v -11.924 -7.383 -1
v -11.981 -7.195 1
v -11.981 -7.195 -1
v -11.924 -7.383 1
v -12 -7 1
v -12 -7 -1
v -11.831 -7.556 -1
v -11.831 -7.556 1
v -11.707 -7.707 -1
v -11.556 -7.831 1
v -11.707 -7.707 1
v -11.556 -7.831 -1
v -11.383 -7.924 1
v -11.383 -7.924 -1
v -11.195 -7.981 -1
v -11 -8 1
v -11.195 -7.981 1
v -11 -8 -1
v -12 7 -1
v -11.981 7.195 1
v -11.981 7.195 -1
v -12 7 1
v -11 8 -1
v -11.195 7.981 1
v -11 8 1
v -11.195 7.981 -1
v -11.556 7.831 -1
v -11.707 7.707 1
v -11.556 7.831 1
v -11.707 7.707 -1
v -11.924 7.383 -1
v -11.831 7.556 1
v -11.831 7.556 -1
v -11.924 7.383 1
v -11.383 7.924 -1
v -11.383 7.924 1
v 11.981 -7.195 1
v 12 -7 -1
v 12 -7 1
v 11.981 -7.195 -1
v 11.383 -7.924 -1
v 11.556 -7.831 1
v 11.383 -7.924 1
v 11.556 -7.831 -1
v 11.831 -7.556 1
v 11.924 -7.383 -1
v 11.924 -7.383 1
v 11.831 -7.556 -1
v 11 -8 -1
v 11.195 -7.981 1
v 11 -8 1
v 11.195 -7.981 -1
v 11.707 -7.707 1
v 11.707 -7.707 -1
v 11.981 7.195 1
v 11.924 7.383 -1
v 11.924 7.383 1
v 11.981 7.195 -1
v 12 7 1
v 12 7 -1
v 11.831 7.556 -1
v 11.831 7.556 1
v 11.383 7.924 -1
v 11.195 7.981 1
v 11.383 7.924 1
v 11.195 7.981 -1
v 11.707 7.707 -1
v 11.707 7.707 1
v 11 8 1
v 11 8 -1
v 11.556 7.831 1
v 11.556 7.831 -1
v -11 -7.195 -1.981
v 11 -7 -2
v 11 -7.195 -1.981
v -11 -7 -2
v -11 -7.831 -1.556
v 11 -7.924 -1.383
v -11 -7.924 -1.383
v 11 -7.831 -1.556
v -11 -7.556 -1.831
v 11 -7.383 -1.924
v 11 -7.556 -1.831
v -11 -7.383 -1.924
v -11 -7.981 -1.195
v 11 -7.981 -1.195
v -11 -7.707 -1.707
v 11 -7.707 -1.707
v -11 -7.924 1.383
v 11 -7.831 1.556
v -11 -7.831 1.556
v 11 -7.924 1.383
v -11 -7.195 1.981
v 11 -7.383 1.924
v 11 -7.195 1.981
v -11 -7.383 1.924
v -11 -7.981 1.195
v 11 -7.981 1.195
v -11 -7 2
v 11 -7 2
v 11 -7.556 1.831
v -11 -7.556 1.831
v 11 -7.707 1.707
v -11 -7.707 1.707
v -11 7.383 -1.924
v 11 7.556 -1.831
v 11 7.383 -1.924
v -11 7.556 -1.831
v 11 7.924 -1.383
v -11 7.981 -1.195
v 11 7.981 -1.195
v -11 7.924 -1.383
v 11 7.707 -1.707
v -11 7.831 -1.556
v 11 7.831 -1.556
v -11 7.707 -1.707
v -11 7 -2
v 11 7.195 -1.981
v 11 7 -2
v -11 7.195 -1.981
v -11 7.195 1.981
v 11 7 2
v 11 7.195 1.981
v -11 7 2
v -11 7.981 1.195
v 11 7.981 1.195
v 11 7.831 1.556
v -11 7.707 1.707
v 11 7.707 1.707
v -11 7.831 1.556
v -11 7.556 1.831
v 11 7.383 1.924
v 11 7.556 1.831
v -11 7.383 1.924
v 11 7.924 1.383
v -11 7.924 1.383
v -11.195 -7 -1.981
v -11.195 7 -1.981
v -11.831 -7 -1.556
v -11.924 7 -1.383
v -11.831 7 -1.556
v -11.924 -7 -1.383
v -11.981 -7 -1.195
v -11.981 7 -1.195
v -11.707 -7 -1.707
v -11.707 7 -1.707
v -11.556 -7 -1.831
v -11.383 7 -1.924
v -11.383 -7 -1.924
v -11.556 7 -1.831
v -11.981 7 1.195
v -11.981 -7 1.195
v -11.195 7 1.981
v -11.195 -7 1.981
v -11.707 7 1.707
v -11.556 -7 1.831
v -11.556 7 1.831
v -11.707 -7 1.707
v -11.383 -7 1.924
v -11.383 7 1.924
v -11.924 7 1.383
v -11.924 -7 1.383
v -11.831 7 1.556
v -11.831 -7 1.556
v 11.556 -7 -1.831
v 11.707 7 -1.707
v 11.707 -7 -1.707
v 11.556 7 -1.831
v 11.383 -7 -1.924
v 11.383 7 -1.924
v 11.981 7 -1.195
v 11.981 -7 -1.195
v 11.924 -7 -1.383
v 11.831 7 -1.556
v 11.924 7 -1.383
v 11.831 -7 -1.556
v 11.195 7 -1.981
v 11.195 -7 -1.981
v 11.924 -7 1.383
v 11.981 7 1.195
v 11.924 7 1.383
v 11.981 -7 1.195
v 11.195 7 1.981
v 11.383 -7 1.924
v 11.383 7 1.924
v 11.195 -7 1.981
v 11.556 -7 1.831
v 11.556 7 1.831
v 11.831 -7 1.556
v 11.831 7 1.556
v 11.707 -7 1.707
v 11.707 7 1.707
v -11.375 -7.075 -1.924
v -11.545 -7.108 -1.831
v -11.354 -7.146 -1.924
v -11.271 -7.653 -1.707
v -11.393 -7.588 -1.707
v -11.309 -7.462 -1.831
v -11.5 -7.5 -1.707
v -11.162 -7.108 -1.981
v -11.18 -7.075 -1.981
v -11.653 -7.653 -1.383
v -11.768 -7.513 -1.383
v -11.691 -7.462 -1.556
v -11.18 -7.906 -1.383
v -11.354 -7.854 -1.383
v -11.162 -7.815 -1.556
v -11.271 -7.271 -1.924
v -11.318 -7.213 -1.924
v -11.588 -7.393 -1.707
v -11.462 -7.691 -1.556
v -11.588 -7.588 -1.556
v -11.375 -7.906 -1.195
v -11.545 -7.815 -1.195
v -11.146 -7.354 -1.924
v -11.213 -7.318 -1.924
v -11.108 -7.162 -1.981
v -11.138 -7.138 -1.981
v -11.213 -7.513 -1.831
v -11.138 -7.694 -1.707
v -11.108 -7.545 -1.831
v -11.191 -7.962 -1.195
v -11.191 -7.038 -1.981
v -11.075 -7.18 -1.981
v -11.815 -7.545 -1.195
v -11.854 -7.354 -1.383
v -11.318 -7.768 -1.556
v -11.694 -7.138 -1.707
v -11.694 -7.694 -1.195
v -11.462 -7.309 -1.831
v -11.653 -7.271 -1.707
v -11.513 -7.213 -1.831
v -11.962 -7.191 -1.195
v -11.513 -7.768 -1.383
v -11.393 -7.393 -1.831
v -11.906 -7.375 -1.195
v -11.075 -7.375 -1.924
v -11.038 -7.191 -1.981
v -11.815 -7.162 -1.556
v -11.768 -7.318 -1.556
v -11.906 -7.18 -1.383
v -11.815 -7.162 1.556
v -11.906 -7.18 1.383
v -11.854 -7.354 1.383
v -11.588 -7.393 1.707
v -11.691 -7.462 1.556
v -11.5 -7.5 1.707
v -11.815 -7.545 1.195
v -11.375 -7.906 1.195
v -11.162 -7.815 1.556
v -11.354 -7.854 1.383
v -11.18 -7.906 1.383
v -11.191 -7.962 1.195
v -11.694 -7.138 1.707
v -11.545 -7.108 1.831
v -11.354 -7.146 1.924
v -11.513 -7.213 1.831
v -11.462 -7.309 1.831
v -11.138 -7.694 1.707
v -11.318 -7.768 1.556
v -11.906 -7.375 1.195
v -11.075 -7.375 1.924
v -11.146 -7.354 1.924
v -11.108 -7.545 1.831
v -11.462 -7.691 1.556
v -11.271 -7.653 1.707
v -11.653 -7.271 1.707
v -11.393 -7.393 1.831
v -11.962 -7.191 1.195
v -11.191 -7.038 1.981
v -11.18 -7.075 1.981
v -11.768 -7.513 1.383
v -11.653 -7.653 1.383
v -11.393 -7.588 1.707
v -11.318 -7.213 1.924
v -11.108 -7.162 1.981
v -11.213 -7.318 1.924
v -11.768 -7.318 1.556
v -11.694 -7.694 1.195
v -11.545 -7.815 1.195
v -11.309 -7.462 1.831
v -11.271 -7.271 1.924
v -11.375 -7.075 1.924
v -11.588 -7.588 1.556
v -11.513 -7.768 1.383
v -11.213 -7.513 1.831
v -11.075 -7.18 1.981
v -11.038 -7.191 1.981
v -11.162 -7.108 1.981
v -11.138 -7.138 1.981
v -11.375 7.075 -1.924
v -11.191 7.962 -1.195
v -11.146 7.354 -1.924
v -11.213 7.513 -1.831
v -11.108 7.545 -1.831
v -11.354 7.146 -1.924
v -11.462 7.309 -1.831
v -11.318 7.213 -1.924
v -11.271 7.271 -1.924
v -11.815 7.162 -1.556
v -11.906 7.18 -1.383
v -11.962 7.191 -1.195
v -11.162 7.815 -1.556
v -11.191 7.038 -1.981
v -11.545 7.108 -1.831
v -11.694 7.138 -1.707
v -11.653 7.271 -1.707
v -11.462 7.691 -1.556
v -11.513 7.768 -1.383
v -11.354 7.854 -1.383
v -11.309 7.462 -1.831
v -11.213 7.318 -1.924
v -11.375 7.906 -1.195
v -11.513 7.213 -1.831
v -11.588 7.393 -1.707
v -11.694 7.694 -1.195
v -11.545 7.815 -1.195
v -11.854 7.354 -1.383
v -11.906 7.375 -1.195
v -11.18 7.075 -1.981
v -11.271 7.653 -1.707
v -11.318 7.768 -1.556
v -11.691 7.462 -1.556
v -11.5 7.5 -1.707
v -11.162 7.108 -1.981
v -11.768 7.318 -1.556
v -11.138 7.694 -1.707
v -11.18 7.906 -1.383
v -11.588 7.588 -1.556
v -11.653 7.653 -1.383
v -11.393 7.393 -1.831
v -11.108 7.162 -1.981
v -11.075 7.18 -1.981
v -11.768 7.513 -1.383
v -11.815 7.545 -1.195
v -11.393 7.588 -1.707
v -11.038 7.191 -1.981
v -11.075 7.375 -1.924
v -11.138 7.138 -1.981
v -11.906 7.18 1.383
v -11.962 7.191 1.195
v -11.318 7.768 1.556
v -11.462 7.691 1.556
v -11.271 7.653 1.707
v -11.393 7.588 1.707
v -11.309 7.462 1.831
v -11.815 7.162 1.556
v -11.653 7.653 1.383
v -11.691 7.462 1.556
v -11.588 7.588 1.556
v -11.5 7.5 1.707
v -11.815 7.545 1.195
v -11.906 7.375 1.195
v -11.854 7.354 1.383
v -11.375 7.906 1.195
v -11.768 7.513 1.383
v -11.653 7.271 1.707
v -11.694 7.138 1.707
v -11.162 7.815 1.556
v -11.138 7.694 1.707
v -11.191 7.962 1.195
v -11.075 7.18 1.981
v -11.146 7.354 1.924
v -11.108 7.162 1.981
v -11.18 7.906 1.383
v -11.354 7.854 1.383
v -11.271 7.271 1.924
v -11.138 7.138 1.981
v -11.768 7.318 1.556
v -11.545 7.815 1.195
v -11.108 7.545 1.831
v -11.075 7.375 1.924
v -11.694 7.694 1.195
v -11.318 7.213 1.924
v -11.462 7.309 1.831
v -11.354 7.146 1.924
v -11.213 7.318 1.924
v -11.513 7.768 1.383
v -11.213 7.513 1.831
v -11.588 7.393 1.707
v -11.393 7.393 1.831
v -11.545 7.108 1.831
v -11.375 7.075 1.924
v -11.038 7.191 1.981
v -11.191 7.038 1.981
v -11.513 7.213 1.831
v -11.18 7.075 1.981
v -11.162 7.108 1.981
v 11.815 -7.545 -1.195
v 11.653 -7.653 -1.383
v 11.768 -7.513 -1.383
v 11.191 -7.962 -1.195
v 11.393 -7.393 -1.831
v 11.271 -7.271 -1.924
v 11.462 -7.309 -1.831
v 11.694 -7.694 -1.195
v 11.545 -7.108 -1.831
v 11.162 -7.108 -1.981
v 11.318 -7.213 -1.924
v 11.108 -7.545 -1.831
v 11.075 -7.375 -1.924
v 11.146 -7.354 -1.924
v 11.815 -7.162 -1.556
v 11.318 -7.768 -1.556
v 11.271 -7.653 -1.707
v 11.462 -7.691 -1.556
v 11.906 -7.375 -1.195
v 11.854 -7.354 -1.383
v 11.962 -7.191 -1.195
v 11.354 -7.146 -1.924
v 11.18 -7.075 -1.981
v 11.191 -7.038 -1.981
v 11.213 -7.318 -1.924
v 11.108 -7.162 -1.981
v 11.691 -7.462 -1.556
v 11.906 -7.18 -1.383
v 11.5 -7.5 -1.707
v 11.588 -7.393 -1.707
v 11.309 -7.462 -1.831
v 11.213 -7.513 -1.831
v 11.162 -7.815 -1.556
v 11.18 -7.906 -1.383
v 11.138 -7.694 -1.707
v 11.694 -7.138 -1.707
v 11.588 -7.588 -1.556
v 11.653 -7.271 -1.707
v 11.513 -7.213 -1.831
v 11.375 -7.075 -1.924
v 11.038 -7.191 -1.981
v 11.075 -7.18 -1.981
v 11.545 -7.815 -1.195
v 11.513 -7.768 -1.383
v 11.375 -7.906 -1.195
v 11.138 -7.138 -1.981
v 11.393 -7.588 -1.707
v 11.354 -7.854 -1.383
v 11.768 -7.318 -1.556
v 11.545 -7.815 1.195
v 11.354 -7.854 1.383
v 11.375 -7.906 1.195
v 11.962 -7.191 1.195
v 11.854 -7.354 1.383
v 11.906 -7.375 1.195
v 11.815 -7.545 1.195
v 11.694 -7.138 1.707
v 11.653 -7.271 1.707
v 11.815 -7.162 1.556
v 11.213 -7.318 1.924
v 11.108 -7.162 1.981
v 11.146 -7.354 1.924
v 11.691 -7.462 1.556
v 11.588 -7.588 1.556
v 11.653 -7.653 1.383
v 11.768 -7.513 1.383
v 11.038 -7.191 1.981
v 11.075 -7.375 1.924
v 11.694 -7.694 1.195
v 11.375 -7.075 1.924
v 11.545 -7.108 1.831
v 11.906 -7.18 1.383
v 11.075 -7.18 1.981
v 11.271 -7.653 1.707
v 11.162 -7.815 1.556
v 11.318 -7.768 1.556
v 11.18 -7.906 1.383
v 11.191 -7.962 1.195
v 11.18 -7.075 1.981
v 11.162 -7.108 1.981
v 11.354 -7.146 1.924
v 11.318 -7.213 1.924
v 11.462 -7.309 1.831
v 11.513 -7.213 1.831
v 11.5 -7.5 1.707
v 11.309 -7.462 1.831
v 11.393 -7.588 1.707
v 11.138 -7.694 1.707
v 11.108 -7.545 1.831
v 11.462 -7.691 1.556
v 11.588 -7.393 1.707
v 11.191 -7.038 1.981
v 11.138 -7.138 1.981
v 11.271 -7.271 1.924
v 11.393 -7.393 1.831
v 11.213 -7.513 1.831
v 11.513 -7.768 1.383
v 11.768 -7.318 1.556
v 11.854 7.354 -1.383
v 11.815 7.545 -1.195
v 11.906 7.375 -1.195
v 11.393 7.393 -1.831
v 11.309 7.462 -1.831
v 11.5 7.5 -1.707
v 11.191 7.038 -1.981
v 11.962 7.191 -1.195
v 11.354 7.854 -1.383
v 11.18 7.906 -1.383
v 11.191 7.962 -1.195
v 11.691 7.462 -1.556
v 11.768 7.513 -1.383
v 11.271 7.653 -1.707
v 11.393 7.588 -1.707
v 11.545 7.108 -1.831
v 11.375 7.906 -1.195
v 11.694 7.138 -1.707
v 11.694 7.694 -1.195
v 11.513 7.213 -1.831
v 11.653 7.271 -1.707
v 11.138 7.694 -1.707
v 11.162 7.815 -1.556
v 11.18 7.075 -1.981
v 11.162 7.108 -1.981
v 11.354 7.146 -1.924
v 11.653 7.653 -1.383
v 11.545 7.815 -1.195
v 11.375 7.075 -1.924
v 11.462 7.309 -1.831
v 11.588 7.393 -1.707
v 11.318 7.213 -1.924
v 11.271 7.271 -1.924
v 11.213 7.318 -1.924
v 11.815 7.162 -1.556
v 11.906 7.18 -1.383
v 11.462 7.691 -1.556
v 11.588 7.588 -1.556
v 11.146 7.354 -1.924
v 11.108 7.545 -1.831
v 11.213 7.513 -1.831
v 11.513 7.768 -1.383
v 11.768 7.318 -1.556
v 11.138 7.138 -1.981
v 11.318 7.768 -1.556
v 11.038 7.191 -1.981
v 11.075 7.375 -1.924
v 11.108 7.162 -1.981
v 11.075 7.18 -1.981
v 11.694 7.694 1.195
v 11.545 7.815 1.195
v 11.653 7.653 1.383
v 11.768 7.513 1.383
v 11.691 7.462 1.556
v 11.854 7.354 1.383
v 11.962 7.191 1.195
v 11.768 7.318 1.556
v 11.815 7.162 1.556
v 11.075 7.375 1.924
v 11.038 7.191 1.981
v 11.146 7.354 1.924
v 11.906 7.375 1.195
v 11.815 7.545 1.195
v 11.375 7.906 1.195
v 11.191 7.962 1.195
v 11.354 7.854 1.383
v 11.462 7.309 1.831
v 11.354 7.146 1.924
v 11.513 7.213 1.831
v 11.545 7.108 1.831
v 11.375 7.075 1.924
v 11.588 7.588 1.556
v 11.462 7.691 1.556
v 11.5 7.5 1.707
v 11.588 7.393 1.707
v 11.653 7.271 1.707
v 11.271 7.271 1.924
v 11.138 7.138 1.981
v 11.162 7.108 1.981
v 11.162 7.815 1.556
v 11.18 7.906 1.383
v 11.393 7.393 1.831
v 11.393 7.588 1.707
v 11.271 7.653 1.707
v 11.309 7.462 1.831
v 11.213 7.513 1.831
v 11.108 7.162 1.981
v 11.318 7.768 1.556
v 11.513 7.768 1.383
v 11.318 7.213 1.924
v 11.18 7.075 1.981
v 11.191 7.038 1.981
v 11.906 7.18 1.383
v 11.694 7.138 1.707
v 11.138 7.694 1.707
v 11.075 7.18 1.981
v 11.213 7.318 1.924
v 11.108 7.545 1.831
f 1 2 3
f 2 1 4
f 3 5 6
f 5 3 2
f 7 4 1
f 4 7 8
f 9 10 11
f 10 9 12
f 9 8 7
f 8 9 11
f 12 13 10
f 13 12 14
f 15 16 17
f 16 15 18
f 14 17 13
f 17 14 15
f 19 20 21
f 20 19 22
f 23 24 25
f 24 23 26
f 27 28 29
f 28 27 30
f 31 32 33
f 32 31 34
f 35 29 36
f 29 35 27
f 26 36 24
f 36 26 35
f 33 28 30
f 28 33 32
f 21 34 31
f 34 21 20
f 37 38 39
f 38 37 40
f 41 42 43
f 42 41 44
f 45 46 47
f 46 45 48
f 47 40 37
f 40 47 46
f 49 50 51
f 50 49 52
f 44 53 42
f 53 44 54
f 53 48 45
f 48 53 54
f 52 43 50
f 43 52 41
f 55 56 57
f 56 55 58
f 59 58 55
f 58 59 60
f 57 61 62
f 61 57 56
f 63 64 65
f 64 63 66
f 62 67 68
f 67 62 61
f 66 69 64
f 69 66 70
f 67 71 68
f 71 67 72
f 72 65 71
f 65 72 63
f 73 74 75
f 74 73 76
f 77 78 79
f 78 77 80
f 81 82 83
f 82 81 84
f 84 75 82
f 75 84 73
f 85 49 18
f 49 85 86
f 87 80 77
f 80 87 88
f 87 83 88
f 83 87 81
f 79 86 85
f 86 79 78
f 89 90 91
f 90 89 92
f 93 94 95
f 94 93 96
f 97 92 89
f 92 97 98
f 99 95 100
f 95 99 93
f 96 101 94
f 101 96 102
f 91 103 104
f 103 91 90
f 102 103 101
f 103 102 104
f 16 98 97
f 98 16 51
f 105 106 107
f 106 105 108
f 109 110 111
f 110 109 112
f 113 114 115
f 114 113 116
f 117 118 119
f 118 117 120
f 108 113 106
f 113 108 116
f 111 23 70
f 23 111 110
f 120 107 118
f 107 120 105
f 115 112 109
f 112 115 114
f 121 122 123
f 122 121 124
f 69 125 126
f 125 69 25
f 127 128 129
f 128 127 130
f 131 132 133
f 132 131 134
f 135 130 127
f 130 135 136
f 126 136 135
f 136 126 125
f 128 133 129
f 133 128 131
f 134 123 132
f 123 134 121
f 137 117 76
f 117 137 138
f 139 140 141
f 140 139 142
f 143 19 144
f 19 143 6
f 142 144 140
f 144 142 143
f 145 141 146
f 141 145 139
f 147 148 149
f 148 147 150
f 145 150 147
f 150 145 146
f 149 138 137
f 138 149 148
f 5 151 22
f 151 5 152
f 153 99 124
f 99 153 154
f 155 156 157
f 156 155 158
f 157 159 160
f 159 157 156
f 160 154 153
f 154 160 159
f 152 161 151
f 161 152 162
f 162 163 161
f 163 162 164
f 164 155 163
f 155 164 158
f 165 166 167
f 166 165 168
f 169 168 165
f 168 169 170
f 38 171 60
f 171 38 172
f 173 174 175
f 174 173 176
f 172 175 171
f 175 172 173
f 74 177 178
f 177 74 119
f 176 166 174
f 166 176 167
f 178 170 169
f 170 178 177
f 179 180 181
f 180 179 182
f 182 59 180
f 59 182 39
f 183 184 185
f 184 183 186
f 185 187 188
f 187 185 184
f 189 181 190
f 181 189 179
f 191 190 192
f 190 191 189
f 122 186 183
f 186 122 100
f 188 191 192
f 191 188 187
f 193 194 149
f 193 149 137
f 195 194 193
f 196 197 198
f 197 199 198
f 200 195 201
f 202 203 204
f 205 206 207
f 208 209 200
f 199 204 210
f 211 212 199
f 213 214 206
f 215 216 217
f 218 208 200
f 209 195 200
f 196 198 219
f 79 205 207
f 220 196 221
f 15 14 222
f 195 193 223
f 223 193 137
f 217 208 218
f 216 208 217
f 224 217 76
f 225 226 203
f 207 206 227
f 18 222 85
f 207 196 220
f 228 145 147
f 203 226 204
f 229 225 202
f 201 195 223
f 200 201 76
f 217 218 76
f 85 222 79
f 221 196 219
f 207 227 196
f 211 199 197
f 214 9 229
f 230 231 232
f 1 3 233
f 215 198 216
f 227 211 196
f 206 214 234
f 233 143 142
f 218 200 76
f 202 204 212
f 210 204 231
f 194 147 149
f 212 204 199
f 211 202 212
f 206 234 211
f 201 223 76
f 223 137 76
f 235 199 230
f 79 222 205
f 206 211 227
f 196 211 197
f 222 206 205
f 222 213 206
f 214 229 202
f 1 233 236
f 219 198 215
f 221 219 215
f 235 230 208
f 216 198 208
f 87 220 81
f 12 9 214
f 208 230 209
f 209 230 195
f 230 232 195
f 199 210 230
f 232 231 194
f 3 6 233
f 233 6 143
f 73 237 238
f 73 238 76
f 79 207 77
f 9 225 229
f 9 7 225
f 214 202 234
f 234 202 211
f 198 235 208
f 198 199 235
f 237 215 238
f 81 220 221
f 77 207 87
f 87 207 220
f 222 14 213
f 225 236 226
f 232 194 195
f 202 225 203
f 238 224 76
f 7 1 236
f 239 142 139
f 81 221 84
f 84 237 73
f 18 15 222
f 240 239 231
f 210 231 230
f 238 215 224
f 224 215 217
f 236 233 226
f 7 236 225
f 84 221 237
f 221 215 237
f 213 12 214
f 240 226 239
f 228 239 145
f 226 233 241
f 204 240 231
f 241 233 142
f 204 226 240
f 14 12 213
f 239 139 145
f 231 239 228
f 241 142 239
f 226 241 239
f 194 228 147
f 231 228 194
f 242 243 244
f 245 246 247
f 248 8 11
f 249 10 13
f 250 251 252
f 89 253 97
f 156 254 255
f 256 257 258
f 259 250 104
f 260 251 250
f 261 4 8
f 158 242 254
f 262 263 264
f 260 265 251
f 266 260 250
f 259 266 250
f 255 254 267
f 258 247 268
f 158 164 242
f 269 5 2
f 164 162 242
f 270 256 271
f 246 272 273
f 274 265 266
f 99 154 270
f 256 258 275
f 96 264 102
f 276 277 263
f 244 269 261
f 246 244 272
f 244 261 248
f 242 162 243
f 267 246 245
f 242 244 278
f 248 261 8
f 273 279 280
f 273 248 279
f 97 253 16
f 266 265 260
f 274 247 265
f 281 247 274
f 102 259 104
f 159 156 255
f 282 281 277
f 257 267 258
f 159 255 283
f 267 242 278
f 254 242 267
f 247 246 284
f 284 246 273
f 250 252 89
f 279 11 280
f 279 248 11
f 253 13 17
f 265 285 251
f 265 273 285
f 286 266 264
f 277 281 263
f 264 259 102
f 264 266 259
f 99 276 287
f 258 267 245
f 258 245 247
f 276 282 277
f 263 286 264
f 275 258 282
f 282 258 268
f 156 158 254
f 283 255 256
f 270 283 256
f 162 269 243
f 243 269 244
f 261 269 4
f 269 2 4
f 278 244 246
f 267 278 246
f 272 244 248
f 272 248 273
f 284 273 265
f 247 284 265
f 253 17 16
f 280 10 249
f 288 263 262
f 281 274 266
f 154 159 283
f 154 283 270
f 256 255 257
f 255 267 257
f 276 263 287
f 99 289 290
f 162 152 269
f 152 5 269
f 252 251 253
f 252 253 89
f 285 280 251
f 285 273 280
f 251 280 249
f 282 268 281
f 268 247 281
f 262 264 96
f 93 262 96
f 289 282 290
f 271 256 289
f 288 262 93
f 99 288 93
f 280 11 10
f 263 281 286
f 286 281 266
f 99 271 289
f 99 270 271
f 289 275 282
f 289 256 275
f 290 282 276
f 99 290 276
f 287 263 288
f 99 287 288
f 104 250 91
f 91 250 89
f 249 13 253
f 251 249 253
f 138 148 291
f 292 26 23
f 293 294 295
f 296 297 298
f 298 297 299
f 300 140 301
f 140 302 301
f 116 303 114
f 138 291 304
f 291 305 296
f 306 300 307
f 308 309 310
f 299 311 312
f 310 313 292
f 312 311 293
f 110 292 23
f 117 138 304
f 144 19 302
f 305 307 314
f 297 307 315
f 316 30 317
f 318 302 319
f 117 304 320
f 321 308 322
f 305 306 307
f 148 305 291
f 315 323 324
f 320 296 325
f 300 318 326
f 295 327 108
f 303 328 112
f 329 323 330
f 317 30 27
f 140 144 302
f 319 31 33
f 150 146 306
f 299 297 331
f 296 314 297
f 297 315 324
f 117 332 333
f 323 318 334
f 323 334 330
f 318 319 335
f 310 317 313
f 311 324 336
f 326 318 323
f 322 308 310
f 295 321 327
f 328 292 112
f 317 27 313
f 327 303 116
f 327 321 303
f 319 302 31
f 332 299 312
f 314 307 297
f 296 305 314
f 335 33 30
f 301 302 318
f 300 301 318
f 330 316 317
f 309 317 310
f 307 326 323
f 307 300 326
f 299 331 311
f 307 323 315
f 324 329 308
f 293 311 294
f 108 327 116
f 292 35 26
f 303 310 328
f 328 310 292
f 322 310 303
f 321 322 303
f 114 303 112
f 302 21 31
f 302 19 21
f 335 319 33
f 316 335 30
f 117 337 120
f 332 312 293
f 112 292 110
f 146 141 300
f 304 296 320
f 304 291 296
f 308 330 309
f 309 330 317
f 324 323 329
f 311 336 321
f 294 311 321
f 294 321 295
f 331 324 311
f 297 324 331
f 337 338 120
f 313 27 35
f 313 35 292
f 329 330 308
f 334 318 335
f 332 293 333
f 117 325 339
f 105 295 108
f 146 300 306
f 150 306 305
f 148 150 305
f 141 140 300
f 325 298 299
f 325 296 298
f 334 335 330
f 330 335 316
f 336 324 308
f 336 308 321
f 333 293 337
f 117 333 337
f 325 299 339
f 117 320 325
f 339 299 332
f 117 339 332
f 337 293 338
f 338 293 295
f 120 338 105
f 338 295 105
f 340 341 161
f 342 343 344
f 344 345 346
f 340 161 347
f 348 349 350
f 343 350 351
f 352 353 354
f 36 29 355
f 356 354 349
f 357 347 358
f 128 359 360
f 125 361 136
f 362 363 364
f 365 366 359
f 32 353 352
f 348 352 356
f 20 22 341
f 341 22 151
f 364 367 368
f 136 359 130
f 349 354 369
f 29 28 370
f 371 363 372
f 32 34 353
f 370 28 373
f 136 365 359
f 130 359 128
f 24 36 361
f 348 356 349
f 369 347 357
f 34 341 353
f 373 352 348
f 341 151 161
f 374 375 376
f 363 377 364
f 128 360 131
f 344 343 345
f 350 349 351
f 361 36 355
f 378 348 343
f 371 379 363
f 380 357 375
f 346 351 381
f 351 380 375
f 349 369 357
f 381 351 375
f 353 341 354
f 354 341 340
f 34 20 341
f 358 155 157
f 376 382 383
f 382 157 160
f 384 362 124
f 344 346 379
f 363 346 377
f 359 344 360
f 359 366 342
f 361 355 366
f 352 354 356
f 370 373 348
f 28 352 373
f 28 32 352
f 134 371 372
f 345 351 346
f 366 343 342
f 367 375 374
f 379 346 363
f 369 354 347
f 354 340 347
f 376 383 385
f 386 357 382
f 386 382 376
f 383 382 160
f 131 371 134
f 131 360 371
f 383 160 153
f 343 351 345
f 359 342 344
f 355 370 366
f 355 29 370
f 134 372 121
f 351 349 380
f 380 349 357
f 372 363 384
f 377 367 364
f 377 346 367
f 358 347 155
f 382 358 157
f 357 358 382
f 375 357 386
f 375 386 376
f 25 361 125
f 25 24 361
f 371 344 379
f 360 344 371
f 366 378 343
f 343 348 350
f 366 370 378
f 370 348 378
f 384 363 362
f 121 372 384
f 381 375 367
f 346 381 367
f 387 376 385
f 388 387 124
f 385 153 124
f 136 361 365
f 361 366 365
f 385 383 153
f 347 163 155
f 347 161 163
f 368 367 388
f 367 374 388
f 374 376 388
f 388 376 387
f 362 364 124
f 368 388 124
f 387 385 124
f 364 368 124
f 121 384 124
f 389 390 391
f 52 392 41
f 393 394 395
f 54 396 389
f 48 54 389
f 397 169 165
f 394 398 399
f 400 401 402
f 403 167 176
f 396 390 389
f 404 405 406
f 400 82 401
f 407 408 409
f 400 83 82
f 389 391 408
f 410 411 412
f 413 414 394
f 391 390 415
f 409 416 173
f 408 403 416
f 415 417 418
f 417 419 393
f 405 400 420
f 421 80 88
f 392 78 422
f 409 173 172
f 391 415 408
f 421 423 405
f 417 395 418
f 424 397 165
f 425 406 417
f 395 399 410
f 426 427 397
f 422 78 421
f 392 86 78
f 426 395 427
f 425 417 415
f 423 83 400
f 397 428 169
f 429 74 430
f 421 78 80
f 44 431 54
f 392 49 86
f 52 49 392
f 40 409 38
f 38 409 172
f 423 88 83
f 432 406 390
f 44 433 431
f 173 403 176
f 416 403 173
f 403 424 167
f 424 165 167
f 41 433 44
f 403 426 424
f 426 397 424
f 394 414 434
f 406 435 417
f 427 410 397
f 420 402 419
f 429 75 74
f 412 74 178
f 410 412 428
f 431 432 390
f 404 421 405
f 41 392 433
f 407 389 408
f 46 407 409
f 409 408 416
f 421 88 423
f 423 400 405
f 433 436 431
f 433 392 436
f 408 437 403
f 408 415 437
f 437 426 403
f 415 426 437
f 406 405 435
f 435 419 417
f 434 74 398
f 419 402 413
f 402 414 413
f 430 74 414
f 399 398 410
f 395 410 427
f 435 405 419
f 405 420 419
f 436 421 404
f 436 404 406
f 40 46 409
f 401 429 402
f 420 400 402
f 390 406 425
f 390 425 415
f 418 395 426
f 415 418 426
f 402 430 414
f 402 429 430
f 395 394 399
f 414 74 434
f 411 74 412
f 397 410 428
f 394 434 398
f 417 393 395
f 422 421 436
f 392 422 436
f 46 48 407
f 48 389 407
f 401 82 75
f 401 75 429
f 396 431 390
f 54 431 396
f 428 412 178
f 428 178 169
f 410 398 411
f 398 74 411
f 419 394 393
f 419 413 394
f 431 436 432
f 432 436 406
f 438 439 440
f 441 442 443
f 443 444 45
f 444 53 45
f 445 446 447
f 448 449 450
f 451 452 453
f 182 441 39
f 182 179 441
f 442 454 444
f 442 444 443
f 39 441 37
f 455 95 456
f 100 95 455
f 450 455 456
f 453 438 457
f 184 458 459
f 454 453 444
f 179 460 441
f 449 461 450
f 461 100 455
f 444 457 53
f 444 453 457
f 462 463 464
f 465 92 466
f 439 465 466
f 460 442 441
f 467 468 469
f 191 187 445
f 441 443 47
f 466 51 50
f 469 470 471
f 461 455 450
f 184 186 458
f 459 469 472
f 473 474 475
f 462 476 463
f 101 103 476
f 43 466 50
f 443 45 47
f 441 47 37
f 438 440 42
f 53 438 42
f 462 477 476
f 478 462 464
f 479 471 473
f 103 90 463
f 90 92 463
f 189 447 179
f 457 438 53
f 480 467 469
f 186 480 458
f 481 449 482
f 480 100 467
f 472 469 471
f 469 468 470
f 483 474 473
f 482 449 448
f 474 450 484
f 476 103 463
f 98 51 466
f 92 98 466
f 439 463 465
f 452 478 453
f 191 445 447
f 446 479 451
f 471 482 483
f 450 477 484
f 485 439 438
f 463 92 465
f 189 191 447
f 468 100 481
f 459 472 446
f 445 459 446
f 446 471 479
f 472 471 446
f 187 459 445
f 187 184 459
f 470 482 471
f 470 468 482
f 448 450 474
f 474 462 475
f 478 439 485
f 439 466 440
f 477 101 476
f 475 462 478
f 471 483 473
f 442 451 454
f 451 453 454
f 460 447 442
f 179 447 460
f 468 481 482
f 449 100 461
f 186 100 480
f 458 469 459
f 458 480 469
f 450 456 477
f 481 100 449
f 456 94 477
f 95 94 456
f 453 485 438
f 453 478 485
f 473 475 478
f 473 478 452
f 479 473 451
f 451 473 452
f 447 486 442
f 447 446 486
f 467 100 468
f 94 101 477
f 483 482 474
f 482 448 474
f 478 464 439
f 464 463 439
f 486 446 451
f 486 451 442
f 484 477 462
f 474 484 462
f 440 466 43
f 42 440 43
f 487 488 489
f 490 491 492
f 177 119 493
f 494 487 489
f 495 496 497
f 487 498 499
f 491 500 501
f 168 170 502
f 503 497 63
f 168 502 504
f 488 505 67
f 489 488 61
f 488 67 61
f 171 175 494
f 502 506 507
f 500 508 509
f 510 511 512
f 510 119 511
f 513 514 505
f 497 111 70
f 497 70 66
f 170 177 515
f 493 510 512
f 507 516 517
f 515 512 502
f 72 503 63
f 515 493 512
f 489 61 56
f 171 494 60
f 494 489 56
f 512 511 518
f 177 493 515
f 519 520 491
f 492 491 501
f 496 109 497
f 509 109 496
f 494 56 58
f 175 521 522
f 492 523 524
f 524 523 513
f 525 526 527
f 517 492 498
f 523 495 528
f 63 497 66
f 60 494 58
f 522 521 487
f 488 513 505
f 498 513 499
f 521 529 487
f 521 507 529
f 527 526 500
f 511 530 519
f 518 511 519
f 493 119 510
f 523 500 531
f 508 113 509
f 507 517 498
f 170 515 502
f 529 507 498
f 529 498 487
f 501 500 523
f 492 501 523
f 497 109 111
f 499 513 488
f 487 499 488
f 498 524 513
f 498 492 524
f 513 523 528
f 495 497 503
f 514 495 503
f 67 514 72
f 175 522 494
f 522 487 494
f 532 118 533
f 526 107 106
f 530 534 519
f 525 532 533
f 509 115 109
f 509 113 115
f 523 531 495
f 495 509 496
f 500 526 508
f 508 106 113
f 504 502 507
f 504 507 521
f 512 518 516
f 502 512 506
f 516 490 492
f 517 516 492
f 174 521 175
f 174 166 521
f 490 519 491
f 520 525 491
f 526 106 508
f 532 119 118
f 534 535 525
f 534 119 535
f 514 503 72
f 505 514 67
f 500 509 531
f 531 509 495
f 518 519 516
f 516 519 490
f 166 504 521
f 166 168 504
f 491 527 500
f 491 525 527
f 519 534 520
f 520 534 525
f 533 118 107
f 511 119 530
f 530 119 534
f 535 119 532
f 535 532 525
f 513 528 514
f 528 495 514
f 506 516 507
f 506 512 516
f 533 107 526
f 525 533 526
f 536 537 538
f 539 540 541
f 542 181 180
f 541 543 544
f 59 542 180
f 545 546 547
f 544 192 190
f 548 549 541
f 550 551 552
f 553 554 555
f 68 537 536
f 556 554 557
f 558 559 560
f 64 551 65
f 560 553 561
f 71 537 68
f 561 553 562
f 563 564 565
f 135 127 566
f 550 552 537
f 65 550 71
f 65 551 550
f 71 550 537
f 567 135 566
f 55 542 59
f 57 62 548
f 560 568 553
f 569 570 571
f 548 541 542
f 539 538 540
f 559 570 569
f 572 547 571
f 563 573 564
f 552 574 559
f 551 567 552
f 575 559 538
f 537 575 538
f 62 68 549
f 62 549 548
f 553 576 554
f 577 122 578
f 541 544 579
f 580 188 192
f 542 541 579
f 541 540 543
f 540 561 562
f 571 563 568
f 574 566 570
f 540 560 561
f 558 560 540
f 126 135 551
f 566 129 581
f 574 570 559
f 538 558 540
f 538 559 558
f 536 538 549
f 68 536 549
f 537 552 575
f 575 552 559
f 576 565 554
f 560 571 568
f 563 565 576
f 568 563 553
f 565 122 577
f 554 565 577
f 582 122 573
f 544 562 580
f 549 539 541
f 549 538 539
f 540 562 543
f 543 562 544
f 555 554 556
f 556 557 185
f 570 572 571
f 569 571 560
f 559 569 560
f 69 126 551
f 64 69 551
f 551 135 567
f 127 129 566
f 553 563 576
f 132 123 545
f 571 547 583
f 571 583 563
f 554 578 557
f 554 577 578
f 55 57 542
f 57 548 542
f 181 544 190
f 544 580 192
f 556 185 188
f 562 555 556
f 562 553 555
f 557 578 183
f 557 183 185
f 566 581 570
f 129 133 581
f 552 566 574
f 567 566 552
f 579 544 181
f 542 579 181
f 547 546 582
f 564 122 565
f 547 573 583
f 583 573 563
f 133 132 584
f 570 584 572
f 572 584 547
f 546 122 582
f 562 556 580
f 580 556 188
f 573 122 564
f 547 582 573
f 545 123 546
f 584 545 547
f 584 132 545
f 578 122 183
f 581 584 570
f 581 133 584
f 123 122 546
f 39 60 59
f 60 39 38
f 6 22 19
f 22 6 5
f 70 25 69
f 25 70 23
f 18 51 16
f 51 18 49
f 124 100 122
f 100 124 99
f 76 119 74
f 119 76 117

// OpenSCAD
signs = [-1, 1];
nudge = -0.3;

module filleted_cuboid_centered(dims, r, $fn = 2) {
	dia = r * 2.0;

	fn = $fn * 4.0;

	sub = [dims.x - dia, dims.y - dia, dims.z - dia];
	assert(sub.x >= 0);
	assert(sub.y >= 0);
	assert(sub.z >= 0);

	union() {
		// internal cuboids to produce flat faces.
		cube([dims.x, sub.y, sub.z], true);
		cube([sub.x, dims.y, sub.z], true);
		cube([sub.x, sub.y, dims.z], true);

		// cylinders for the edges.
		for (x = signs) {
		for (y = signs) {
			translate([x * sub.x * 0.5, y * sub.y * 0.5, 0]) {
				cylinder(h = sub.z, r = r, center = true, $fn = fn);
			};
		};
		};

		for (y = signs) {
		for (z = signs) {
			translate([0, y * sub.y * 0.5, z * sub.z * 0.5]) {
				rotate([0,90,0]) {
					cylinder(h = sub.x, r = r, center = true, $fn = fn);
					
				}
			};
		};
		};

		
		for (x = signs) {
		for (z = signs) {
			translate([x * sub.x * 0.5, 0, z * sub.z * 0.5]) {
				rotate([90,0,0]) {
					cylinder(h = sub.y, r = r, center = true, $fn = fn);
					
				}
			};
		};
		};

		// sphere-like shapes for the corners.
		// one cannot actually use spheres directly as one winds up with discontinuous geometry.
		// below a shape guaranteed to line up with cylinder representation is used;
		// sphere() doesn't actually work exactly like the below in practice.
		for (x = signs) {
		for (y = signs) {
		for (z = signs) {
			tr = [x * sub.x * 0.5, y * sub.y * 0.5, z * sub.z * 0.5];
			translate(tr) {
				rotate_extrude($fn = fn) intersection() {
					circle(r = r, $fn = fn);
					translate([0,-r]) square(size=[r, 2. * r]);
				}
			}
		}
		}
		}
	};
}

fn = 8;
filleted_cuboid_centered([24, 16, 4], 1, $fn = fn);
